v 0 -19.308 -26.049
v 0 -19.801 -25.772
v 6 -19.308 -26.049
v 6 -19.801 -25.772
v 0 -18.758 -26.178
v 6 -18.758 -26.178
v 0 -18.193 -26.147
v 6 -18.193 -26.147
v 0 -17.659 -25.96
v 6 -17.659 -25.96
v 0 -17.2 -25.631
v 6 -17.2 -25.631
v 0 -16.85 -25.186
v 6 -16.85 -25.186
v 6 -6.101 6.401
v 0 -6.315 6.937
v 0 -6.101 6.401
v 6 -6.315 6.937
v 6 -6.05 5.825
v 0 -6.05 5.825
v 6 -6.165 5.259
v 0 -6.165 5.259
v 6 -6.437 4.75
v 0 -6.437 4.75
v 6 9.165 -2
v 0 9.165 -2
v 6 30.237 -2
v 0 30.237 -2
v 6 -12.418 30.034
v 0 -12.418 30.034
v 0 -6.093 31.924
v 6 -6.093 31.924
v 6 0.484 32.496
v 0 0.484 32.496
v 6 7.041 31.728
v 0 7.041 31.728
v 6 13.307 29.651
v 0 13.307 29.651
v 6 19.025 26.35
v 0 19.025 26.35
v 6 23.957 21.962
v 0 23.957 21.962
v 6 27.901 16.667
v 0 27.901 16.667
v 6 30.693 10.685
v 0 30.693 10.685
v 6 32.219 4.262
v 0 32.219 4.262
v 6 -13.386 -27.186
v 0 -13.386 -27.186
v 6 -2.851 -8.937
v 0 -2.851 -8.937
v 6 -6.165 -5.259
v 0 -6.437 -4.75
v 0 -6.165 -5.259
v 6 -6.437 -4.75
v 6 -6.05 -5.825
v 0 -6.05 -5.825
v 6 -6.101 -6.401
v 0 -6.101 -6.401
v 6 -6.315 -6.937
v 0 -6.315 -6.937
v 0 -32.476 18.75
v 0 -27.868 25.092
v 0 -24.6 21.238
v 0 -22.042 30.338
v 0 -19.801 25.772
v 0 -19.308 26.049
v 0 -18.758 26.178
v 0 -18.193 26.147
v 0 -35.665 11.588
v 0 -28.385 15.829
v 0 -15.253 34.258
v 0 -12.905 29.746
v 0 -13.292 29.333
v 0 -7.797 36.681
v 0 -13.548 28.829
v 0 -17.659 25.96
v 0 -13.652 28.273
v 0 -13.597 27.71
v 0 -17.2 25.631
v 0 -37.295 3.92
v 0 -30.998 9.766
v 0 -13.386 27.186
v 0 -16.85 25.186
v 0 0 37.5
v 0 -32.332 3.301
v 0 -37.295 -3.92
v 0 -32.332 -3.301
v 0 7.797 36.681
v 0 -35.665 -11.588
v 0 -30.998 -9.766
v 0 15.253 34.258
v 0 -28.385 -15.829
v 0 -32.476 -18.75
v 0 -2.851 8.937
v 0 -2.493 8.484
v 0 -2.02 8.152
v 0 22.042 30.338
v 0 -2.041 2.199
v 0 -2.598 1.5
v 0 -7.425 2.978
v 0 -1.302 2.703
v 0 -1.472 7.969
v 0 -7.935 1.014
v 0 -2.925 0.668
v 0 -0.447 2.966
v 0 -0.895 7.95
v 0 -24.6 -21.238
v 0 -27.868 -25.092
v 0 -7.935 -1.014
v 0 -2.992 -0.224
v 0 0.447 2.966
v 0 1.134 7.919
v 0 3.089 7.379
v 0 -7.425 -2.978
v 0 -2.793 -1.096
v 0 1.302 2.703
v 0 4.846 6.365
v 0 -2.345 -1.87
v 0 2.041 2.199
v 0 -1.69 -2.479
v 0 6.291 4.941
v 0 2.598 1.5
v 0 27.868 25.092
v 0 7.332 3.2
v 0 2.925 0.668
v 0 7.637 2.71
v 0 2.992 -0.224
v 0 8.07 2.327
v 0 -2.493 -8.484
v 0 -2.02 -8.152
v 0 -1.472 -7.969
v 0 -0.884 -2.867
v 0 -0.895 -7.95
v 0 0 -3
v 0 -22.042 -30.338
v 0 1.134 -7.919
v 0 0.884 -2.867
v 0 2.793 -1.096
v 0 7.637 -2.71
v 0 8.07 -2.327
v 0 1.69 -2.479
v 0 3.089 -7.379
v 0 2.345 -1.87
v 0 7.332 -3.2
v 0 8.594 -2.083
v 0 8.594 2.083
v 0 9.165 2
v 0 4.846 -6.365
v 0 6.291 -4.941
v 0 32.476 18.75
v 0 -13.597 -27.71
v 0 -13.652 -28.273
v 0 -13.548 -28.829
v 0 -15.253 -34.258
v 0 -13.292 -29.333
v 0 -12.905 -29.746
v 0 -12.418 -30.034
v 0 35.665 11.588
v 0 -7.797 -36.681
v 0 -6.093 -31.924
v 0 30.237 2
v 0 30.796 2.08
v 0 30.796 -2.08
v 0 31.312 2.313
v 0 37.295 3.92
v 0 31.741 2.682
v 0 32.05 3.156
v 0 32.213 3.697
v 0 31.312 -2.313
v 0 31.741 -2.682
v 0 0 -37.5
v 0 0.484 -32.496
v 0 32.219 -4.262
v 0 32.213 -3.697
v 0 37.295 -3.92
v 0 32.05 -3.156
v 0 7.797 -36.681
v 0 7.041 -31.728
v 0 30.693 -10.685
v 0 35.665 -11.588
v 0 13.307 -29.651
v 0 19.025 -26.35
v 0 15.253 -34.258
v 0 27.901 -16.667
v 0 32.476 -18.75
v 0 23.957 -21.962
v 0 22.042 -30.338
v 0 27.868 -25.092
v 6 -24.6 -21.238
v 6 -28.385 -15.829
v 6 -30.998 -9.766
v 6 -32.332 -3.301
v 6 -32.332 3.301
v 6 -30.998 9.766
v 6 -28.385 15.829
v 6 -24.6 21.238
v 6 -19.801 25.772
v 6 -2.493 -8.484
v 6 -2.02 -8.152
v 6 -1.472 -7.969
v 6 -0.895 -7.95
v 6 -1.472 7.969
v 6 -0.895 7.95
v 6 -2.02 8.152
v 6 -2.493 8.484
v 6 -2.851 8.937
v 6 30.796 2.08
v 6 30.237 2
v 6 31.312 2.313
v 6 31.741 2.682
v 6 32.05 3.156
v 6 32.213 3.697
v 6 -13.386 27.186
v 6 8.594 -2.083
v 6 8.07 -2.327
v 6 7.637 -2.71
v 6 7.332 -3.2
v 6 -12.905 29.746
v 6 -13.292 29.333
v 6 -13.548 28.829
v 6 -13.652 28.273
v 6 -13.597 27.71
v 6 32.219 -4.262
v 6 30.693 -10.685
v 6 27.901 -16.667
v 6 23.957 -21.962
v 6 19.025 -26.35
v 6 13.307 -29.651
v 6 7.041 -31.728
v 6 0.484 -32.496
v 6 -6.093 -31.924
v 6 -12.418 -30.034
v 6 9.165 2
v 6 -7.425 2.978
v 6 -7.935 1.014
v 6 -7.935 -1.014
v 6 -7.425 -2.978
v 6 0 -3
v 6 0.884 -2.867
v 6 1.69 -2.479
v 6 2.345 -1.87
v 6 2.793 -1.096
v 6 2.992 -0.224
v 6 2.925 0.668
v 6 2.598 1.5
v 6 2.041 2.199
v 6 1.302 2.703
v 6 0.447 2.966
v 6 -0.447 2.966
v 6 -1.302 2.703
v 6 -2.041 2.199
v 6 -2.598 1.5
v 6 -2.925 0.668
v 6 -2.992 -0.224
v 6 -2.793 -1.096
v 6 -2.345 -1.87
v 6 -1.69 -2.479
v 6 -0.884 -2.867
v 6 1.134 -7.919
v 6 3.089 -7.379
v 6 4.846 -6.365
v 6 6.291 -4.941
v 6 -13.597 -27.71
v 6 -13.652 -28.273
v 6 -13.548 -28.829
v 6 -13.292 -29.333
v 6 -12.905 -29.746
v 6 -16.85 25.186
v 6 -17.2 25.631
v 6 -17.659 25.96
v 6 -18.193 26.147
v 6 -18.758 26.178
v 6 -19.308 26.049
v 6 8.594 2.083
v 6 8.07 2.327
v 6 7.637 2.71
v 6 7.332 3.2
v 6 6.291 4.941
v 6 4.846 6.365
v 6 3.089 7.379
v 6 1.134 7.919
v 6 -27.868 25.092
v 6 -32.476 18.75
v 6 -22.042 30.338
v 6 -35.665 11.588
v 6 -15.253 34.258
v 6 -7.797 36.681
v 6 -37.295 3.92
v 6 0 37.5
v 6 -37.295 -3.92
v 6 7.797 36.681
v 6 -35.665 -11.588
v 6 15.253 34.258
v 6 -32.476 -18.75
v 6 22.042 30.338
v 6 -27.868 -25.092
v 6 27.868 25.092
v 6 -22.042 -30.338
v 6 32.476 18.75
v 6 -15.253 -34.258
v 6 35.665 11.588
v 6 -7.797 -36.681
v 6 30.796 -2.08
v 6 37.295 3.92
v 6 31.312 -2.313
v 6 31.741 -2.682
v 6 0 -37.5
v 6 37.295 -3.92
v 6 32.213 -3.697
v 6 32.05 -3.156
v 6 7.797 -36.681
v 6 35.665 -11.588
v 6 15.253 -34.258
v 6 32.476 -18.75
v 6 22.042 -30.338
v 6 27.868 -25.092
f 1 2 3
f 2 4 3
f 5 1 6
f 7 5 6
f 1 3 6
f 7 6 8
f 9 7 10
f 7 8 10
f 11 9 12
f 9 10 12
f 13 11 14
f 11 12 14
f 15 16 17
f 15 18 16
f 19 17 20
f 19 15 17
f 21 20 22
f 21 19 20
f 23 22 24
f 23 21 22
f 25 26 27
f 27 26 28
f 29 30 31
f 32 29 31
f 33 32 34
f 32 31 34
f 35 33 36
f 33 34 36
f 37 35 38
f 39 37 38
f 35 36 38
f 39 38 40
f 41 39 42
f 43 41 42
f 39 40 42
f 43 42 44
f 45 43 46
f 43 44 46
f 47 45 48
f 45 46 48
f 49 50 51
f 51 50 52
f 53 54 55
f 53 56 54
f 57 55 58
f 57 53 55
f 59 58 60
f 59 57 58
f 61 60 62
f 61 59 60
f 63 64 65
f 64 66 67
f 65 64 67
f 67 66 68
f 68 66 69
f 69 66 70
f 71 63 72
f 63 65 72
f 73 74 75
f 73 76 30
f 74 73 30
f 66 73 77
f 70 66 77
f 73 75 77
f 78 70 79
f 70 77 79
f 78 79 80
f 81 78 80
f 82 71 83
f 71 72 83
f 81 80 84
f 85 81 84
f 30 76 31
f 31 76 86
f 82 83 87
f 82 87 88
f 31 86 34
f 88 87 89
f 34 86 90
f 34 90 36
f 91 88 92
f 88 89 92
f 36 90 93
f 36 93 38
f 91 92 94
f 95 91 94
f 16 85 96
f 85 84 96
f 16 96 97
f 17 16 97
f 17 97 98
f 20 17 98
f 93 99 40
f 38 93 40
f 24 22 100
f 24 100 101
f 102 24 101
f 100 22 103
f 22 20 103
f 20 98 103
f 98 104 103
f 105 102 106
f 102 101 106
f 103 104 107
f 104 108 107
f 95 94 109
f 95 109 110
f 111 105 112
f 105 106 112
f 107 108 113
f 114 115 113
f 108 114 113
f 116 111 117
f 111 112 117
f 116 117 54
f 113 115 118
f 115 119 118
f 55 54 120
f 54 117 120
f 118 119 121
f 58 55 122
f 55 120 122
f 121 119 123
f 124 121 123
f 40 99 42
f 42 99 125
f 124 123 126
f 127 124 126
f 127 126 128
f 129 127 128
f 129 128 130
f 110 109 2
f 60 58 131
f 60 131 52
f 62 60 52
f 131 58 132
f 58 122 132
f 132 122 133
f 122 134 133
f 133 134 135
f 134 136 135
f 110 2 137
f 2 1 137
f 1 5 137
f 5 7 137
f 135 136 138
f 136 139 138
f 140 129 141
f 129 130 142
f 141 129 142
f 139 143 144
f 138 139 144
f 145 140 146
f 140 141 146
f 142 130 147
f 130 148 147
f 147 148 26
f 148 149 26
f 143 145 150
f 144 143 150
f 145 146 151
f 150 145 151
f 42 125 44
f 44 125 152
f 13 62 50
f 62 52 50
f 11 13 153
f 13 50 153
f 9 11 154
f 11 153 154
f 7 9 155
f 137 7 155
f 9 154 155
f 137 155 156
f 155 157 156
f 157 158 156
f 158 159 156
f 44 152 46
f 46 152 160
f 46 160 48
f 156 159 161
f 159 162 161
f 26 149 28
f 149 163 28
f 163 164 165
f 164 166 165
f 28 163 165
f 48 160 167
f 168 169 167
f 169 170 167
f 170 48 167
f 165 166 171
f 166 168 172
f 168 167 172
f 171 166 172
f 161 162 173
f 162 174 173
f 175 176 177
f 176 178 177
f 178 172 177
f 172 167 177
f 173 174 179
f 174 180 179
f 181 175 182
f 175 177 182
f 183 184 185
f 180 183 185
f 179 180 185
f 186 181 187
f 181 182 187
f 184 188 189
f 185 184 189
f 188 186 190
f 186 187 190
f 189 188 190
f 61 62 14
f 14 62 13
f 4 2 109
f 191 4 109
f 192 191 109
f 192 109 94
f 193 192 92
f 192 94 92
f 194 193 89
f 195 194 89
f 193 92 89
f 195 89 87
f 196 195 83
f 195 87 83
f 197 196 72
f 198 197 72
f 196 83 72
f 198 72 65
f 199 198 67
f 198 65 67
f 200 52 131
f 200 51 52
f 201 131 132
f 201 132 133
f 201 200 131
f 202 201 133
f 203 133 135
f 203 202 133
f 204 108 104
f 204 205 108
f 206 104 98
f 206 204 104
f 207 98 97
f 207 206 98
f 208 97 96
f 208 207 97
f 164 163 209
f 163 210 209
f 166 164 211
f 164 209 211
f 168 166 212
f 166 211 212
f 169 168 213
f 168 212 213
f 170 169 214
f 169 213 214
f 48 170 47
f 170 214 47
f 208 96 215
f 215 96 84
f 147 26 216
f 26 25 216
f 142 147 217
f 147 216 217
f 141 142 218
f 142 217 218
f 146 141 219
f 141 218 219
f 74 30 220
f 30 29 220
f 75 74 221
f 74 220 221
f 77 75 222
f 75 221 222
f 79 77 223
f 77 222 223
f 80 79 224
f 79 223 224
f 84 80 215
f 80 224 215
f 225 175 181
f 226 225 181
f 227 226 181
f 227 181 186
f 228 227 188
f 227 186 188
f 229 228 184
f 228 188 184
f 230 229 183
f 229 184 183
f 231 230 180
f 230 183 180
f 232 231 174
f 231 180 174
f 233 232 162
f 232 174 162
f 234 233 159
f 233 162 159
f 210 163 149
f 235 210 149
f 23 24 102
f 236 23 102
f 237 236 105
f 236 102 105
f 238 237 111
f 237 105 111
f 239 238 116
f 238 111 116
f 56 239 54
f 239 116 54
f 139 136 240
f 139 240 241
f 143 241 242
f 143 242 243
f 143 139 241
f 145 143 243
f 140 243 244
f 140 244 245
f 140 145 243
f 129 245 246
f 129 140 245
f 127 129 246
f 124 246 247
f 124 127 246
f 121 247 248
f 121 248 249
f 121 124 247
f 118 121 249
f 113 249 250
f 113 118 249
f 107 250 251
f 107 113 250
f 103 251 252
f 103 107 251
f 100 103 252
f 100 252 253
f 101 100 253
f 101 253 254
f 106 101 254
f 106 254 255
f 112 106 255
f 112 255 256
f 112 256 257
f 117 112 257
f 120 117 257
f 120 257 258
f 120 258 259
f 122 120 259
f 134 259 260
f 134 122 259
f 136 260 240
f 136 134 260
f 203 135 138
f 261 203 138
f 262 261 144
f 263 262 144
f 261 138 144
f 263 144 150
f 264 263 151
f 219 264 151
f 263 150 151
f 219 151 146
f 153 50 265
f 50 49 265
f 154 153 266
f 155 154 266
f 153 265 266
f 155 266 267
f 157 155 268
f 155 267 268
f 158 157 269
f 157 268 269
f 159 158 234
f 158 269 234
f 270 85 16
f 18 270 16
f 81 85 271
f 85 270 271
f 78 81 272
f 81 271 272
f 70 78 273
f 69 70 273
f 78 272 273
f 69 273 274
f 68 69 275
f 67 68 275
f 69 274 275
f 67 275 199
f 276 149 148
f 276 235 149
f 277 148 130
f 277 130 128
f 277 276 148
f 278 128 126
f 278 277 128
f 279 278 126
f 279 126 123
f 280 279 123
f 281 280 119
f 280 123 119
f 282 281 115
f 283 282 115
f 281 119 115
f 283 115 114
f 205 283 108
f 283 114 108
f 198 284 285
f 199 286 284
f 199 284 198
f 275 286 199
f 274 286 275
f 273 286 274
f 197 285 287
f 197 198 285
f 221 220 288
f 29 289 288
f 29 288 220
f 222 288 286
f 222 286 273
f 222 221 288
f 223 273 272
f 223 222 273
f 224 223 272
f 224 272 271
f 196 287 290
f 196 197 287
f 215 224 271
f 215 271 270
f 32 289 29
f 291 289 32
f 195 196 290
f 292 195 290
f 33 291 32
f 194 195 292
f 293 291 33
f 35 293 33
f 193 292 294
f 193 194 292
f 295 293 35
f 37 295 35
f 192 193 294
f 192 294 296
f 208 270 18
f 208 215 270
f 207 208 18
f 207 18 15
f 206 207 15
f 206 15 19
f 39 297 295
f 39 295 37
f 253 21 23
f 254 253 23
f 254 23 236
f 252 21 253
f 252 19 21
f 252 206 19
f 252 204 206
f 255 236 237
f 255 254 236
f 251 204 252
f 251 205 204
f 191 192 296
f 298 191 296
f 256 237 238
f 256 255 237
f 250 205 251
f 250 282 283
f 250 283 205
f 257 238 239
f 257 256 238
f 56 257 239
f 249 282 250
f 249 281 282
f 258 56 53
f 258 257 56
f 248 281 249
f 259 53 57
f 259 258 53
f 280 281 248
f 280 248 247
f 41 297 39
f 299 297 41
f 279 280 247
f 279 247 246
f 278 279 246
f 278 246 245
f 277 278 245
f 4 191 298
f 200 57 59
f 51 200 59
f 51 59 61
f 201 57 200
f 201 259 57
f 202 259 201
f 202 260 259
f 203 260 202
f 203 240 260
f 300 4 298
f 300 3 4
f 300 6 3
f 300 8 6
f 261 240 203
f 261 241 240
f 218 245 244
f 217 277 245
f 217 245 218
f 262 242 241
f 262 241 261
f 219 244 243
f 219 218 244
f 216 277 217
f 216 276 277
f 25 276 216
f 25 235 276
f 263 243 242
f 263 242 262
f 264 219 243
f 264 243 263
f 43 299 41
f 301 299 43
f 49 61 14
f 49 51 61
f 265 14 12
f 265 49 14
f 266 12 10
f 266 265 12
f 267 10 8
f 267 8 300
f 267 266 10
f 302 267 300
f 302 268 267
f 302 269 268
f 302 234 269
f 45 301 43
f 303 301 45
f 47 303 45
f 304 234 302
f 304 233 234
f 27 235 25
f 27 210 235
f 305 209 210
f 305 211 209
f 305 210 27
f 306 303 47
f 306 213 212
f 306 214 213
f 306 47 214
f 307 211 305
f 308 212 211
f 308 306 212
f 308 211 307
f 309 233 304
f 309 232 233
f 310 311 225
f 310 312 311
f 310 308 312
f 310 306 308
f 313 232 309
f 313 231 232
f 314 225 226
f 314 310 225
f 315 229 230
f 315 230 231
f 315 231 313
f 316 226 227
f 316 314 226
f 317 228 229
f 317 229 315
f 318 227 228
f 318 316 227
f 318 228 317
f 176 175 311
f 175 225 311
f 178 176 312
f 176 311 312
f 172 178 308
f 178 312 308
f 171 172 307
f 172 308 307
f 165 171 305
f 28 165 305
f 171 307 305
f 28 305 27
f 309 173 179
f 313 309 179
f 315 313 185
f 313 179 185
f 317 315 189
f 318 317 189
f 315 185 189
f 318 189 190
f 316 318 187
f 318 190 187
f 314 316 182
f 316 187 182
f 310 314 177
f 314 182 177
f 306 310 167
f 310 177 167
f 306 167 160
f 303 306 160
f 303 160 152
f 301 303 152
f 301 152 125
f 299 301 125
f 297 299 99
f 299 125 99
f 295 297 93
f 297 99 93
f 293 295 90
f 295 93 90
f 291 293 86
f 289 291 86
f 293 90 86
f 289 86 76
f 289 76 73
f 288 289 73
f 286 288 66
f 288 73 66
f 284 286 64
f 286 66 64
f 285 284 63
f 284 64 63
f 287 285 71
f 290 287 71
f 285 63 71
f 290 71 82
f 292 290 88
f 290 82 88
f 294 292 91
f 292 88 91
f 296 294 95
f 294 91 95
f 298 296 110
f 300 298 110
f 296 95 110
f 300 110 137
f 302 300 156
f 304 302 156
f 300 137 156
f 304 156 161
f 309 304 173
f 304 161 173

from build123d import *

# Parameters (mm, degrees)
SKETCH1_R           = 37.5
SKETCH1_R_2         = 3
BOSS_EXTRUDE1_DEPTH = 6
FILLET1_R           = 2


with BuildPart() as part:
    # Sketch1 → Boss-Extrude1 (new body)
    with BuildSketch(Plane(origin=(0, 0, 0), x_dir=(0, 0, -1), z_dir=(1, 0, 0))):
        Circle(SKETCH1_R)
        with BuildLine():
            ThreePointArc((-2, 7.745966692), (-6.92820323, 4), (-7.708203932, -2.140932539))
            Line((-7.708203932, -2.140932539), (-29.0924812, -14.487150776))
            ThreePointArc((-29.0924812, -14.487150776), (-28.145825623, 16.25), (-2, 32.438403167))
            Line((-2, 32.438403167), (-2, 7.745966692))
        make_face(mode=Mode.SUBTRACT)
        Circle(SKETCH1_R_2, mode=Mode.SUBTRACT)
        with BuildLine():
            ThreePointArc((-5.708203932, -5.605034154), (0, -8), (5.708203933, -5.605034154))
            Line((5.708203933, -5.605034154), (27.0924812, -17.951252391))
            ThreePointArc((27.0924812, -17.951252391), (0, -32.5), (-27.0924812, -17.951252391))
            Line((-27.0924812, -17.951252391), (-5.708203932, -5.605034154))
        make_face(mode=Mode.SUBTRACT)
        with BuildLine():
            ThreePointArc((7.708203933, -2.140932539), (6.92820323, 4), (2, 7.745966692))
            Line((2, 7.745966692), (2, 32.438403167))
            ThreePointArc((2, 32.438403167), (28.145825623, 16.25), (29.0924812, -14.487150776))
            Line((29.0924812, -14.487150776), (7.708203933, -2.140932539))
        make_face(mode=Mode.SUBTRACT)
    extrude(amount=BOSS_EXTRUDE1_DEPTH)

    # Fillet1
    fillet1_edges = [part.edges().sort_by_distance(p)[0] for p in [
        (3, 32.438403167, 2),
        (3, -14.487150776, 29.0924812),
        (3, -2.140932539, 7.708203932),
        (3, 7.745966692, 2),
        (3, -17.951252391, 27.0924812),
        (3, -17.951252391, -27.0924812),
        (3, -5.605034154, -5.708203933),
        (3, -5.605034154, 5.708203932),
        (3, -14.487150776, -29.0924812),
        (3, 32.438403167, -2),
        (3, 7.745966692, -2),
        (3, -2.140932539, -7.708203933),
    ]]
    fillet(fillet1_edges, radius=FILLET1_R)


solid = part.part
